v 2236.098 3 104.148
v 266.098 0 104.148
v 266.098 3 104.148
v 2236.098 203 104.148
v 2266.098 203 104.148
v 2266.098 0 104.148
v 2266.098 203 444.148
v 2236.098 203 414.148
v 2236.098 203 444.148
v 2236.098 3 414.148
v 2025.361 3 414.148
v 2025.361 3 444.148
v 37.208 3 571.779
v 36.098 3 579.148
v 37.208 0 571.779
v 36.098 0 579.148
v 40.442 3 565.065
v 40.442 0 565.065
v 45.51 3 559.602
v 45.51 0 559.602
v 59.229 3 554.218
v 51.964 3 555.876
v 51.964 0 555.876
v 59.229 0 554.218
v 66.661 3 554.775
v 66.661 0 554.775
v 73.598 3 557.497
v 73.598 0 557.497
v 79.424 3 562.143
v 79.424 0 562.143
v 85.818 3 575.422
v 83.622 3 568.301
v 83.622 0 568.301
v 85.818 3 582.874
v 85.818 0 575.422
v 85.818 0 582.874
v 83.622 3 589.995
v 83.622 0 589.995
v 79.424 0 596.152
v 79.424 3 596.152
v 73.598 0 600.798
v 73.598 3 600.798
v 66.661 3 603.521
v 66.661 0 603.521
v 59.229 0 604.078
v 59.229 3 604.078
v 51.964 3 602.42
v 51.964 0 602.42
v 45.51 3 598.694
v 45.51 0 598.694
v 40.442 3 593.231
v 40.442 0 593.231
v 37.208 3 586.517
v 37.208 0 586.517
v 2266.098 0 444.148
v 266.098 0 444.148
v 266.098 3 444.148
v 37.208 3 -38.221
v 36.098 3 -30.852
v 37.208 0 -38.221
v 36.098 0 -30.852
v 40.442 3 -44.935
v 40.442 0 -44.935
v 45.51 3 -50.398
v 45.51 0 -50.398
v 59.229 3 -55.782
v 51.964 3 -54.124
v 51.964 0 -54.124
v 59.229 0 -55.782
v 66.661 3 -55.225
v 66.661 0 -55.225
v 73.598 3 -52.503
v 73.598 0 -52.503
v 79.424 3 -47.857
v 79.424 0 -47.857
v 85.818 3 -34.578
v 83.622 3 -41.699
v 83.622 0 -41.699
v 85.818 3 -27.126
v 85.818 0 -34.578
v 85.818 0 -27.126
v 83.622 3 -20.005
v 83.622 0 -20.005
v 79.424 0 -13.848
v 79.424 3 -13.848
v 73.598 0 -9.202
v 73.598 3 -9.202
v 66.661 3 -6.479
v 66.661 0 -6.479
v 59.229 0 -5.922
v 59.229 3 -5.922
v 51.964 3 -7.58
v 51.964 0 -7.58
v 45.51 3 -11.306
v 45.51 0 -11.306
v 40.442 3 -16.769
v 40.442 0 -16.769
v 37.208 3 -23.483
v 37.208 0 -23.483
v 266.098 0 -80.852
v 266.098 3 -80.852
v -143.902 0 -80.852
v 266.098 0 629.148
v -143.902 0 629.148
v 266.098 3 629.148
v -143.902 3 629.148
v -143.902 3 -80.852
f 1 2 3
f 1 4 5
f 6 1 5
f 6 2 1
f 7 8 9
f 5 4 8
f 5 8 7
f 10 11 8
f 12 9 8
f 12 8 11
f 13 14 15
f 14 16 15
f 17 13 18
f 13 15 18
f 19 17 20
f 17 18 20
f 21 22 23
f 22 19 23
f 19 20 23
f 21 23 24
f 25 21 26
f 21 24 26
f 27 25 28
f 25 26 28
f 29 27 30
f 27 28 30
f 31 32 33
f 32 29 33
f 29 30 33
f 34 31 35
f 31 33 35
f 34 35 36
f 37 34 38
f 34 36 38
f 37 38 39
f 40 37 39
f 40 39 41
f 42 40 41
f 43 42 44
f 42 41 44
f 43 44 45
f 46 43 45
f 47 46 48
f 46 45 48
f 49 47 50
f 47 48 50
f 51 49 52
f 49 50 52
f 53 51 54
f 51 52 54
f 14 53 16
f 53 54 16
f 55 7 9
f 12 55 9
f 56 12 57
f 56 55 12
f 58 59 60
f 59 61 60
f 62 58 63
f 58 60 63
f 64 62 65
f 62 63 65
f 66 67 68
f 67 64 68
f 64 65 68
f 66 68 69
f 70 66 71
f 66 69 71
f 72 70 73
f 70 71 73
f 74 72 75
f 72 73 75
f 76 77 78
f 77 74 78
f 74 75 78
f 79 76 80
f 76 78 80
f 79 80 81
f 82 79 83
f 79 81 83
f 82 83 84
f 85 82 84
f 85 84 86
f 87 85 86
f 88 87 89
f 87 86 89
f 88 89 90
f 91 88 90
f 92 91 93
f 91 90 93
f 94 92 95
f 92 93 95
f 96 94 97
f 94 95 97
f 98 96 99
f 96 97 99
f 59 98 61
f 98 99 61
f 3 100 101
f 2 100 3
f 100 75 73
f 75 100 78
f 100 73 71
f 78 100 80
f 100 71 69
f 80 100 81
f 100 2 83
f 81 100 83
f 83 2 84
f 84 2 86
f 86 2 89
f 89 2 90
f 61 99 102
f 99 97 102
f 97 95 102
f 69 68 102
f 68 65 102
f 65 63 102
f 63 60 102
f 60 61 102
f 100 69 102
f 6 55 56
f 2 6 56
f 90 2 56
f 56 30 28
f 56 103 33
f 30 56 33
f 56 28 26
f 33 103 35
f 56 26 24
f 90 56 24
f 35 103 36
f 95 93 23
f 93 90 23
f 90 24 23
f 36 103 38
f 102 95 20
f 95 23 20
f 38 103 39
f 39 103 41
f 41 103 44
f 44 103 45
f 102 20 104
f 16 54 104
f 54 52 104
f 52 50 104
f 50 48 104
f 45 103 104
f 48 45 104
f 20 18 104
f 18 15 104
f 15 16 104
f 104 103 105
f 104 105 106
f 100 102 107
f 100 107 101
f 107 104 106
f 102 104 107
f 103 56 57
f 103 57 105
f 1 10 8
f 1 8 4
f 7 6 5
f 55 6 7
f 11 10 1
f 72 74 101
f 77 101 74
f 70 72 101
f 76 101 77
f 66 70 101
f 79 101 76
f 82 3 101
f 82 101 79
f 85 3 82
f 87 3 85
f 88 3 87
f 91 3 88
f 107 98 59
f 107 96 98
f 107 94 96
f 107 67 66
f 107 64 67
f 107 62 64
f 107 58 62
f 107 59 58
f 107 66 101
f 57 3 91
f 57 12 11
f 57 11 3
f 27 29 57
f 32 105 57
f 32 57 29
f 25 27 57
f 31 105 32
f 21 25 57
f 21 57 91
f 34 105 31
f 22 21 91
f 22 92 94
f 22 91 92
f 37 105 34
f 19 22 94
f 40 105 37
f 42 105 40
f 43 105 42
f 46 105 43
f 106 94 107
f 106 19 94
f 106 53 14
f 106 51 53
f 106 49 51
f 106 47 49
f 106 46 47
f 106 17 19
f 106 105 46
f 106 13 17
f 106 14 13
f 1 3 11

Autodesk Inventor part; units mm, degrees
ref_plane "YZ Plane" through (0, 0, 0) normal (1, 0, 0) x (0, 1, 0)
ref_plane "XZ Plane" through (0, 0, 0) normal (0, 1, 0) x (-1, 0, 0)
ref_plane "XY Plane" through (0, 0, 0) normal (0, 0, 1) x (1, 0, 0)
sketch "Sketch1" plane through (0, 0, 0) normal (0, 1, 0) x (-1, 0, 0)
  line L0 (-266.0977, 629.1478) -> (143.9023, 629.1478)
  line L1 (143.9023, 629.1478) -> (143.9023, -80.8522)
  line L2 (143.9023, -80.8522) -> (-266.0977, -80.8522)
  line L3 (-266.0977, -80.8522) -> (-266.0977, 629.1478)
  circle A0 centre (-61.0977, 579.1478) radius 25
  circle A1 centre (-61.0977, -30.8522) radius 25
  point P0 (0, 0)
  dimension "d0" = 710
  dimension "d1" = 410
  dimension "d4" = 50
  dimension "d5" = 50
extrude "Extrusion1" add sketch "Sketch1" along normal blind 3
sketch "Sketch2" plane through (266.0977, 0, 629.1478) normal (1, 0, 0) x (0, 0, -1)
  line L0 (710, 3) -> (0, 3) projected
  line L1 (710, 3) -> (0, 3)
  line L2 (0, 3) -> (0, 0)
  line L3 (0, 0) -> (710, 0)
  line L4 (710, 0) -> (710, 3)
  line L5 (355, 0) -> (525, 0)
  line L6 (710, 0) -> (0, 0) projected
  line L7 (355, 3) -> (185, 3)
  line L8 (185, 3) -> (525, 3)
  line L9 (525, 3) -> (525, 0)
  line L10 (525, 0) -> (185, 0)
  line L11 (185, 0) -> (185, 3)
  point P0 (629.1478, 0)
  dimension "d8" = 170
  dimension "d9" = 170
extrude "Extrusion2" add sketch "Sketch2" along normal blind 2000 contours L9 L3 L11 L0
sketch "Sketch3" plane through (0, 3, 0) normal (0, 1, 0) x (1, 0, 0)
  line L0 (2266.0977, -104.1478) -> (2266.0977, -444.1478) projected
  line L1 (266.0977, -104.1478) -> (2266.0977, -104.1478) projected
  line L2 (2266.0977, -444.1478) -> (2236.0977, -444.1478)
  line L3 (2236.0977, -444.1478) -> (2236.0977, -104.1478)
  line L4 (2236.0977, -104.1478) -> (2266.0977, -104.1478)
  line L5 (2266.0977, -104.1478) -> (2266.0977, -444.1478)
  point P0 (0, 0)
  dimension "d12" = 340
  dimension "d13" = 30
extrude "Extrusion3" add sketch "Sketch3" along normal blind 200
sketch "Sketch4" plane through (266.0977, 0, 444.1478) normal (0, 0, 1) x (1, 0, 0)
  line L0 (1970, 3) -> (1970, 203) projected
  line L1 (1970, 203) -> (1970, 2.607)
  line L2 (0, 0) -> (2000, 0) projected
  line L3 (1970, 203) -> (1758.8495, 2.607)
  line L4 (1758.8495, 2.607) -> (1970, 2.607)
  line L5 (1970, 203) -> (1970, 2.607)
  point P0 (-266.0977, 0)
extrude "Extrusion4" add sketch "Sketch4" against normal blind 30
sketch "Sketch5" plane through (0, 3, 0) normal (0, 1, 0) x (1, 0, 0)
  line L0 (266.0977, 80.8522) -> (-143.9023, 80.8522) projected
  line L1 (-143.9023, 80.8522) -> (2266.0977, 80.8522)
  line L2 (-143.9023, 80.8522) -> (-143.9023, -629.1478) projected
  line L3 (-143.9023, 80.8522) -> (-143.9023, -629.1478)
  point P0 (0, 0)
  dimension "d18" = 2410
  dimension "d19" = 710
properties part number "soporte"
